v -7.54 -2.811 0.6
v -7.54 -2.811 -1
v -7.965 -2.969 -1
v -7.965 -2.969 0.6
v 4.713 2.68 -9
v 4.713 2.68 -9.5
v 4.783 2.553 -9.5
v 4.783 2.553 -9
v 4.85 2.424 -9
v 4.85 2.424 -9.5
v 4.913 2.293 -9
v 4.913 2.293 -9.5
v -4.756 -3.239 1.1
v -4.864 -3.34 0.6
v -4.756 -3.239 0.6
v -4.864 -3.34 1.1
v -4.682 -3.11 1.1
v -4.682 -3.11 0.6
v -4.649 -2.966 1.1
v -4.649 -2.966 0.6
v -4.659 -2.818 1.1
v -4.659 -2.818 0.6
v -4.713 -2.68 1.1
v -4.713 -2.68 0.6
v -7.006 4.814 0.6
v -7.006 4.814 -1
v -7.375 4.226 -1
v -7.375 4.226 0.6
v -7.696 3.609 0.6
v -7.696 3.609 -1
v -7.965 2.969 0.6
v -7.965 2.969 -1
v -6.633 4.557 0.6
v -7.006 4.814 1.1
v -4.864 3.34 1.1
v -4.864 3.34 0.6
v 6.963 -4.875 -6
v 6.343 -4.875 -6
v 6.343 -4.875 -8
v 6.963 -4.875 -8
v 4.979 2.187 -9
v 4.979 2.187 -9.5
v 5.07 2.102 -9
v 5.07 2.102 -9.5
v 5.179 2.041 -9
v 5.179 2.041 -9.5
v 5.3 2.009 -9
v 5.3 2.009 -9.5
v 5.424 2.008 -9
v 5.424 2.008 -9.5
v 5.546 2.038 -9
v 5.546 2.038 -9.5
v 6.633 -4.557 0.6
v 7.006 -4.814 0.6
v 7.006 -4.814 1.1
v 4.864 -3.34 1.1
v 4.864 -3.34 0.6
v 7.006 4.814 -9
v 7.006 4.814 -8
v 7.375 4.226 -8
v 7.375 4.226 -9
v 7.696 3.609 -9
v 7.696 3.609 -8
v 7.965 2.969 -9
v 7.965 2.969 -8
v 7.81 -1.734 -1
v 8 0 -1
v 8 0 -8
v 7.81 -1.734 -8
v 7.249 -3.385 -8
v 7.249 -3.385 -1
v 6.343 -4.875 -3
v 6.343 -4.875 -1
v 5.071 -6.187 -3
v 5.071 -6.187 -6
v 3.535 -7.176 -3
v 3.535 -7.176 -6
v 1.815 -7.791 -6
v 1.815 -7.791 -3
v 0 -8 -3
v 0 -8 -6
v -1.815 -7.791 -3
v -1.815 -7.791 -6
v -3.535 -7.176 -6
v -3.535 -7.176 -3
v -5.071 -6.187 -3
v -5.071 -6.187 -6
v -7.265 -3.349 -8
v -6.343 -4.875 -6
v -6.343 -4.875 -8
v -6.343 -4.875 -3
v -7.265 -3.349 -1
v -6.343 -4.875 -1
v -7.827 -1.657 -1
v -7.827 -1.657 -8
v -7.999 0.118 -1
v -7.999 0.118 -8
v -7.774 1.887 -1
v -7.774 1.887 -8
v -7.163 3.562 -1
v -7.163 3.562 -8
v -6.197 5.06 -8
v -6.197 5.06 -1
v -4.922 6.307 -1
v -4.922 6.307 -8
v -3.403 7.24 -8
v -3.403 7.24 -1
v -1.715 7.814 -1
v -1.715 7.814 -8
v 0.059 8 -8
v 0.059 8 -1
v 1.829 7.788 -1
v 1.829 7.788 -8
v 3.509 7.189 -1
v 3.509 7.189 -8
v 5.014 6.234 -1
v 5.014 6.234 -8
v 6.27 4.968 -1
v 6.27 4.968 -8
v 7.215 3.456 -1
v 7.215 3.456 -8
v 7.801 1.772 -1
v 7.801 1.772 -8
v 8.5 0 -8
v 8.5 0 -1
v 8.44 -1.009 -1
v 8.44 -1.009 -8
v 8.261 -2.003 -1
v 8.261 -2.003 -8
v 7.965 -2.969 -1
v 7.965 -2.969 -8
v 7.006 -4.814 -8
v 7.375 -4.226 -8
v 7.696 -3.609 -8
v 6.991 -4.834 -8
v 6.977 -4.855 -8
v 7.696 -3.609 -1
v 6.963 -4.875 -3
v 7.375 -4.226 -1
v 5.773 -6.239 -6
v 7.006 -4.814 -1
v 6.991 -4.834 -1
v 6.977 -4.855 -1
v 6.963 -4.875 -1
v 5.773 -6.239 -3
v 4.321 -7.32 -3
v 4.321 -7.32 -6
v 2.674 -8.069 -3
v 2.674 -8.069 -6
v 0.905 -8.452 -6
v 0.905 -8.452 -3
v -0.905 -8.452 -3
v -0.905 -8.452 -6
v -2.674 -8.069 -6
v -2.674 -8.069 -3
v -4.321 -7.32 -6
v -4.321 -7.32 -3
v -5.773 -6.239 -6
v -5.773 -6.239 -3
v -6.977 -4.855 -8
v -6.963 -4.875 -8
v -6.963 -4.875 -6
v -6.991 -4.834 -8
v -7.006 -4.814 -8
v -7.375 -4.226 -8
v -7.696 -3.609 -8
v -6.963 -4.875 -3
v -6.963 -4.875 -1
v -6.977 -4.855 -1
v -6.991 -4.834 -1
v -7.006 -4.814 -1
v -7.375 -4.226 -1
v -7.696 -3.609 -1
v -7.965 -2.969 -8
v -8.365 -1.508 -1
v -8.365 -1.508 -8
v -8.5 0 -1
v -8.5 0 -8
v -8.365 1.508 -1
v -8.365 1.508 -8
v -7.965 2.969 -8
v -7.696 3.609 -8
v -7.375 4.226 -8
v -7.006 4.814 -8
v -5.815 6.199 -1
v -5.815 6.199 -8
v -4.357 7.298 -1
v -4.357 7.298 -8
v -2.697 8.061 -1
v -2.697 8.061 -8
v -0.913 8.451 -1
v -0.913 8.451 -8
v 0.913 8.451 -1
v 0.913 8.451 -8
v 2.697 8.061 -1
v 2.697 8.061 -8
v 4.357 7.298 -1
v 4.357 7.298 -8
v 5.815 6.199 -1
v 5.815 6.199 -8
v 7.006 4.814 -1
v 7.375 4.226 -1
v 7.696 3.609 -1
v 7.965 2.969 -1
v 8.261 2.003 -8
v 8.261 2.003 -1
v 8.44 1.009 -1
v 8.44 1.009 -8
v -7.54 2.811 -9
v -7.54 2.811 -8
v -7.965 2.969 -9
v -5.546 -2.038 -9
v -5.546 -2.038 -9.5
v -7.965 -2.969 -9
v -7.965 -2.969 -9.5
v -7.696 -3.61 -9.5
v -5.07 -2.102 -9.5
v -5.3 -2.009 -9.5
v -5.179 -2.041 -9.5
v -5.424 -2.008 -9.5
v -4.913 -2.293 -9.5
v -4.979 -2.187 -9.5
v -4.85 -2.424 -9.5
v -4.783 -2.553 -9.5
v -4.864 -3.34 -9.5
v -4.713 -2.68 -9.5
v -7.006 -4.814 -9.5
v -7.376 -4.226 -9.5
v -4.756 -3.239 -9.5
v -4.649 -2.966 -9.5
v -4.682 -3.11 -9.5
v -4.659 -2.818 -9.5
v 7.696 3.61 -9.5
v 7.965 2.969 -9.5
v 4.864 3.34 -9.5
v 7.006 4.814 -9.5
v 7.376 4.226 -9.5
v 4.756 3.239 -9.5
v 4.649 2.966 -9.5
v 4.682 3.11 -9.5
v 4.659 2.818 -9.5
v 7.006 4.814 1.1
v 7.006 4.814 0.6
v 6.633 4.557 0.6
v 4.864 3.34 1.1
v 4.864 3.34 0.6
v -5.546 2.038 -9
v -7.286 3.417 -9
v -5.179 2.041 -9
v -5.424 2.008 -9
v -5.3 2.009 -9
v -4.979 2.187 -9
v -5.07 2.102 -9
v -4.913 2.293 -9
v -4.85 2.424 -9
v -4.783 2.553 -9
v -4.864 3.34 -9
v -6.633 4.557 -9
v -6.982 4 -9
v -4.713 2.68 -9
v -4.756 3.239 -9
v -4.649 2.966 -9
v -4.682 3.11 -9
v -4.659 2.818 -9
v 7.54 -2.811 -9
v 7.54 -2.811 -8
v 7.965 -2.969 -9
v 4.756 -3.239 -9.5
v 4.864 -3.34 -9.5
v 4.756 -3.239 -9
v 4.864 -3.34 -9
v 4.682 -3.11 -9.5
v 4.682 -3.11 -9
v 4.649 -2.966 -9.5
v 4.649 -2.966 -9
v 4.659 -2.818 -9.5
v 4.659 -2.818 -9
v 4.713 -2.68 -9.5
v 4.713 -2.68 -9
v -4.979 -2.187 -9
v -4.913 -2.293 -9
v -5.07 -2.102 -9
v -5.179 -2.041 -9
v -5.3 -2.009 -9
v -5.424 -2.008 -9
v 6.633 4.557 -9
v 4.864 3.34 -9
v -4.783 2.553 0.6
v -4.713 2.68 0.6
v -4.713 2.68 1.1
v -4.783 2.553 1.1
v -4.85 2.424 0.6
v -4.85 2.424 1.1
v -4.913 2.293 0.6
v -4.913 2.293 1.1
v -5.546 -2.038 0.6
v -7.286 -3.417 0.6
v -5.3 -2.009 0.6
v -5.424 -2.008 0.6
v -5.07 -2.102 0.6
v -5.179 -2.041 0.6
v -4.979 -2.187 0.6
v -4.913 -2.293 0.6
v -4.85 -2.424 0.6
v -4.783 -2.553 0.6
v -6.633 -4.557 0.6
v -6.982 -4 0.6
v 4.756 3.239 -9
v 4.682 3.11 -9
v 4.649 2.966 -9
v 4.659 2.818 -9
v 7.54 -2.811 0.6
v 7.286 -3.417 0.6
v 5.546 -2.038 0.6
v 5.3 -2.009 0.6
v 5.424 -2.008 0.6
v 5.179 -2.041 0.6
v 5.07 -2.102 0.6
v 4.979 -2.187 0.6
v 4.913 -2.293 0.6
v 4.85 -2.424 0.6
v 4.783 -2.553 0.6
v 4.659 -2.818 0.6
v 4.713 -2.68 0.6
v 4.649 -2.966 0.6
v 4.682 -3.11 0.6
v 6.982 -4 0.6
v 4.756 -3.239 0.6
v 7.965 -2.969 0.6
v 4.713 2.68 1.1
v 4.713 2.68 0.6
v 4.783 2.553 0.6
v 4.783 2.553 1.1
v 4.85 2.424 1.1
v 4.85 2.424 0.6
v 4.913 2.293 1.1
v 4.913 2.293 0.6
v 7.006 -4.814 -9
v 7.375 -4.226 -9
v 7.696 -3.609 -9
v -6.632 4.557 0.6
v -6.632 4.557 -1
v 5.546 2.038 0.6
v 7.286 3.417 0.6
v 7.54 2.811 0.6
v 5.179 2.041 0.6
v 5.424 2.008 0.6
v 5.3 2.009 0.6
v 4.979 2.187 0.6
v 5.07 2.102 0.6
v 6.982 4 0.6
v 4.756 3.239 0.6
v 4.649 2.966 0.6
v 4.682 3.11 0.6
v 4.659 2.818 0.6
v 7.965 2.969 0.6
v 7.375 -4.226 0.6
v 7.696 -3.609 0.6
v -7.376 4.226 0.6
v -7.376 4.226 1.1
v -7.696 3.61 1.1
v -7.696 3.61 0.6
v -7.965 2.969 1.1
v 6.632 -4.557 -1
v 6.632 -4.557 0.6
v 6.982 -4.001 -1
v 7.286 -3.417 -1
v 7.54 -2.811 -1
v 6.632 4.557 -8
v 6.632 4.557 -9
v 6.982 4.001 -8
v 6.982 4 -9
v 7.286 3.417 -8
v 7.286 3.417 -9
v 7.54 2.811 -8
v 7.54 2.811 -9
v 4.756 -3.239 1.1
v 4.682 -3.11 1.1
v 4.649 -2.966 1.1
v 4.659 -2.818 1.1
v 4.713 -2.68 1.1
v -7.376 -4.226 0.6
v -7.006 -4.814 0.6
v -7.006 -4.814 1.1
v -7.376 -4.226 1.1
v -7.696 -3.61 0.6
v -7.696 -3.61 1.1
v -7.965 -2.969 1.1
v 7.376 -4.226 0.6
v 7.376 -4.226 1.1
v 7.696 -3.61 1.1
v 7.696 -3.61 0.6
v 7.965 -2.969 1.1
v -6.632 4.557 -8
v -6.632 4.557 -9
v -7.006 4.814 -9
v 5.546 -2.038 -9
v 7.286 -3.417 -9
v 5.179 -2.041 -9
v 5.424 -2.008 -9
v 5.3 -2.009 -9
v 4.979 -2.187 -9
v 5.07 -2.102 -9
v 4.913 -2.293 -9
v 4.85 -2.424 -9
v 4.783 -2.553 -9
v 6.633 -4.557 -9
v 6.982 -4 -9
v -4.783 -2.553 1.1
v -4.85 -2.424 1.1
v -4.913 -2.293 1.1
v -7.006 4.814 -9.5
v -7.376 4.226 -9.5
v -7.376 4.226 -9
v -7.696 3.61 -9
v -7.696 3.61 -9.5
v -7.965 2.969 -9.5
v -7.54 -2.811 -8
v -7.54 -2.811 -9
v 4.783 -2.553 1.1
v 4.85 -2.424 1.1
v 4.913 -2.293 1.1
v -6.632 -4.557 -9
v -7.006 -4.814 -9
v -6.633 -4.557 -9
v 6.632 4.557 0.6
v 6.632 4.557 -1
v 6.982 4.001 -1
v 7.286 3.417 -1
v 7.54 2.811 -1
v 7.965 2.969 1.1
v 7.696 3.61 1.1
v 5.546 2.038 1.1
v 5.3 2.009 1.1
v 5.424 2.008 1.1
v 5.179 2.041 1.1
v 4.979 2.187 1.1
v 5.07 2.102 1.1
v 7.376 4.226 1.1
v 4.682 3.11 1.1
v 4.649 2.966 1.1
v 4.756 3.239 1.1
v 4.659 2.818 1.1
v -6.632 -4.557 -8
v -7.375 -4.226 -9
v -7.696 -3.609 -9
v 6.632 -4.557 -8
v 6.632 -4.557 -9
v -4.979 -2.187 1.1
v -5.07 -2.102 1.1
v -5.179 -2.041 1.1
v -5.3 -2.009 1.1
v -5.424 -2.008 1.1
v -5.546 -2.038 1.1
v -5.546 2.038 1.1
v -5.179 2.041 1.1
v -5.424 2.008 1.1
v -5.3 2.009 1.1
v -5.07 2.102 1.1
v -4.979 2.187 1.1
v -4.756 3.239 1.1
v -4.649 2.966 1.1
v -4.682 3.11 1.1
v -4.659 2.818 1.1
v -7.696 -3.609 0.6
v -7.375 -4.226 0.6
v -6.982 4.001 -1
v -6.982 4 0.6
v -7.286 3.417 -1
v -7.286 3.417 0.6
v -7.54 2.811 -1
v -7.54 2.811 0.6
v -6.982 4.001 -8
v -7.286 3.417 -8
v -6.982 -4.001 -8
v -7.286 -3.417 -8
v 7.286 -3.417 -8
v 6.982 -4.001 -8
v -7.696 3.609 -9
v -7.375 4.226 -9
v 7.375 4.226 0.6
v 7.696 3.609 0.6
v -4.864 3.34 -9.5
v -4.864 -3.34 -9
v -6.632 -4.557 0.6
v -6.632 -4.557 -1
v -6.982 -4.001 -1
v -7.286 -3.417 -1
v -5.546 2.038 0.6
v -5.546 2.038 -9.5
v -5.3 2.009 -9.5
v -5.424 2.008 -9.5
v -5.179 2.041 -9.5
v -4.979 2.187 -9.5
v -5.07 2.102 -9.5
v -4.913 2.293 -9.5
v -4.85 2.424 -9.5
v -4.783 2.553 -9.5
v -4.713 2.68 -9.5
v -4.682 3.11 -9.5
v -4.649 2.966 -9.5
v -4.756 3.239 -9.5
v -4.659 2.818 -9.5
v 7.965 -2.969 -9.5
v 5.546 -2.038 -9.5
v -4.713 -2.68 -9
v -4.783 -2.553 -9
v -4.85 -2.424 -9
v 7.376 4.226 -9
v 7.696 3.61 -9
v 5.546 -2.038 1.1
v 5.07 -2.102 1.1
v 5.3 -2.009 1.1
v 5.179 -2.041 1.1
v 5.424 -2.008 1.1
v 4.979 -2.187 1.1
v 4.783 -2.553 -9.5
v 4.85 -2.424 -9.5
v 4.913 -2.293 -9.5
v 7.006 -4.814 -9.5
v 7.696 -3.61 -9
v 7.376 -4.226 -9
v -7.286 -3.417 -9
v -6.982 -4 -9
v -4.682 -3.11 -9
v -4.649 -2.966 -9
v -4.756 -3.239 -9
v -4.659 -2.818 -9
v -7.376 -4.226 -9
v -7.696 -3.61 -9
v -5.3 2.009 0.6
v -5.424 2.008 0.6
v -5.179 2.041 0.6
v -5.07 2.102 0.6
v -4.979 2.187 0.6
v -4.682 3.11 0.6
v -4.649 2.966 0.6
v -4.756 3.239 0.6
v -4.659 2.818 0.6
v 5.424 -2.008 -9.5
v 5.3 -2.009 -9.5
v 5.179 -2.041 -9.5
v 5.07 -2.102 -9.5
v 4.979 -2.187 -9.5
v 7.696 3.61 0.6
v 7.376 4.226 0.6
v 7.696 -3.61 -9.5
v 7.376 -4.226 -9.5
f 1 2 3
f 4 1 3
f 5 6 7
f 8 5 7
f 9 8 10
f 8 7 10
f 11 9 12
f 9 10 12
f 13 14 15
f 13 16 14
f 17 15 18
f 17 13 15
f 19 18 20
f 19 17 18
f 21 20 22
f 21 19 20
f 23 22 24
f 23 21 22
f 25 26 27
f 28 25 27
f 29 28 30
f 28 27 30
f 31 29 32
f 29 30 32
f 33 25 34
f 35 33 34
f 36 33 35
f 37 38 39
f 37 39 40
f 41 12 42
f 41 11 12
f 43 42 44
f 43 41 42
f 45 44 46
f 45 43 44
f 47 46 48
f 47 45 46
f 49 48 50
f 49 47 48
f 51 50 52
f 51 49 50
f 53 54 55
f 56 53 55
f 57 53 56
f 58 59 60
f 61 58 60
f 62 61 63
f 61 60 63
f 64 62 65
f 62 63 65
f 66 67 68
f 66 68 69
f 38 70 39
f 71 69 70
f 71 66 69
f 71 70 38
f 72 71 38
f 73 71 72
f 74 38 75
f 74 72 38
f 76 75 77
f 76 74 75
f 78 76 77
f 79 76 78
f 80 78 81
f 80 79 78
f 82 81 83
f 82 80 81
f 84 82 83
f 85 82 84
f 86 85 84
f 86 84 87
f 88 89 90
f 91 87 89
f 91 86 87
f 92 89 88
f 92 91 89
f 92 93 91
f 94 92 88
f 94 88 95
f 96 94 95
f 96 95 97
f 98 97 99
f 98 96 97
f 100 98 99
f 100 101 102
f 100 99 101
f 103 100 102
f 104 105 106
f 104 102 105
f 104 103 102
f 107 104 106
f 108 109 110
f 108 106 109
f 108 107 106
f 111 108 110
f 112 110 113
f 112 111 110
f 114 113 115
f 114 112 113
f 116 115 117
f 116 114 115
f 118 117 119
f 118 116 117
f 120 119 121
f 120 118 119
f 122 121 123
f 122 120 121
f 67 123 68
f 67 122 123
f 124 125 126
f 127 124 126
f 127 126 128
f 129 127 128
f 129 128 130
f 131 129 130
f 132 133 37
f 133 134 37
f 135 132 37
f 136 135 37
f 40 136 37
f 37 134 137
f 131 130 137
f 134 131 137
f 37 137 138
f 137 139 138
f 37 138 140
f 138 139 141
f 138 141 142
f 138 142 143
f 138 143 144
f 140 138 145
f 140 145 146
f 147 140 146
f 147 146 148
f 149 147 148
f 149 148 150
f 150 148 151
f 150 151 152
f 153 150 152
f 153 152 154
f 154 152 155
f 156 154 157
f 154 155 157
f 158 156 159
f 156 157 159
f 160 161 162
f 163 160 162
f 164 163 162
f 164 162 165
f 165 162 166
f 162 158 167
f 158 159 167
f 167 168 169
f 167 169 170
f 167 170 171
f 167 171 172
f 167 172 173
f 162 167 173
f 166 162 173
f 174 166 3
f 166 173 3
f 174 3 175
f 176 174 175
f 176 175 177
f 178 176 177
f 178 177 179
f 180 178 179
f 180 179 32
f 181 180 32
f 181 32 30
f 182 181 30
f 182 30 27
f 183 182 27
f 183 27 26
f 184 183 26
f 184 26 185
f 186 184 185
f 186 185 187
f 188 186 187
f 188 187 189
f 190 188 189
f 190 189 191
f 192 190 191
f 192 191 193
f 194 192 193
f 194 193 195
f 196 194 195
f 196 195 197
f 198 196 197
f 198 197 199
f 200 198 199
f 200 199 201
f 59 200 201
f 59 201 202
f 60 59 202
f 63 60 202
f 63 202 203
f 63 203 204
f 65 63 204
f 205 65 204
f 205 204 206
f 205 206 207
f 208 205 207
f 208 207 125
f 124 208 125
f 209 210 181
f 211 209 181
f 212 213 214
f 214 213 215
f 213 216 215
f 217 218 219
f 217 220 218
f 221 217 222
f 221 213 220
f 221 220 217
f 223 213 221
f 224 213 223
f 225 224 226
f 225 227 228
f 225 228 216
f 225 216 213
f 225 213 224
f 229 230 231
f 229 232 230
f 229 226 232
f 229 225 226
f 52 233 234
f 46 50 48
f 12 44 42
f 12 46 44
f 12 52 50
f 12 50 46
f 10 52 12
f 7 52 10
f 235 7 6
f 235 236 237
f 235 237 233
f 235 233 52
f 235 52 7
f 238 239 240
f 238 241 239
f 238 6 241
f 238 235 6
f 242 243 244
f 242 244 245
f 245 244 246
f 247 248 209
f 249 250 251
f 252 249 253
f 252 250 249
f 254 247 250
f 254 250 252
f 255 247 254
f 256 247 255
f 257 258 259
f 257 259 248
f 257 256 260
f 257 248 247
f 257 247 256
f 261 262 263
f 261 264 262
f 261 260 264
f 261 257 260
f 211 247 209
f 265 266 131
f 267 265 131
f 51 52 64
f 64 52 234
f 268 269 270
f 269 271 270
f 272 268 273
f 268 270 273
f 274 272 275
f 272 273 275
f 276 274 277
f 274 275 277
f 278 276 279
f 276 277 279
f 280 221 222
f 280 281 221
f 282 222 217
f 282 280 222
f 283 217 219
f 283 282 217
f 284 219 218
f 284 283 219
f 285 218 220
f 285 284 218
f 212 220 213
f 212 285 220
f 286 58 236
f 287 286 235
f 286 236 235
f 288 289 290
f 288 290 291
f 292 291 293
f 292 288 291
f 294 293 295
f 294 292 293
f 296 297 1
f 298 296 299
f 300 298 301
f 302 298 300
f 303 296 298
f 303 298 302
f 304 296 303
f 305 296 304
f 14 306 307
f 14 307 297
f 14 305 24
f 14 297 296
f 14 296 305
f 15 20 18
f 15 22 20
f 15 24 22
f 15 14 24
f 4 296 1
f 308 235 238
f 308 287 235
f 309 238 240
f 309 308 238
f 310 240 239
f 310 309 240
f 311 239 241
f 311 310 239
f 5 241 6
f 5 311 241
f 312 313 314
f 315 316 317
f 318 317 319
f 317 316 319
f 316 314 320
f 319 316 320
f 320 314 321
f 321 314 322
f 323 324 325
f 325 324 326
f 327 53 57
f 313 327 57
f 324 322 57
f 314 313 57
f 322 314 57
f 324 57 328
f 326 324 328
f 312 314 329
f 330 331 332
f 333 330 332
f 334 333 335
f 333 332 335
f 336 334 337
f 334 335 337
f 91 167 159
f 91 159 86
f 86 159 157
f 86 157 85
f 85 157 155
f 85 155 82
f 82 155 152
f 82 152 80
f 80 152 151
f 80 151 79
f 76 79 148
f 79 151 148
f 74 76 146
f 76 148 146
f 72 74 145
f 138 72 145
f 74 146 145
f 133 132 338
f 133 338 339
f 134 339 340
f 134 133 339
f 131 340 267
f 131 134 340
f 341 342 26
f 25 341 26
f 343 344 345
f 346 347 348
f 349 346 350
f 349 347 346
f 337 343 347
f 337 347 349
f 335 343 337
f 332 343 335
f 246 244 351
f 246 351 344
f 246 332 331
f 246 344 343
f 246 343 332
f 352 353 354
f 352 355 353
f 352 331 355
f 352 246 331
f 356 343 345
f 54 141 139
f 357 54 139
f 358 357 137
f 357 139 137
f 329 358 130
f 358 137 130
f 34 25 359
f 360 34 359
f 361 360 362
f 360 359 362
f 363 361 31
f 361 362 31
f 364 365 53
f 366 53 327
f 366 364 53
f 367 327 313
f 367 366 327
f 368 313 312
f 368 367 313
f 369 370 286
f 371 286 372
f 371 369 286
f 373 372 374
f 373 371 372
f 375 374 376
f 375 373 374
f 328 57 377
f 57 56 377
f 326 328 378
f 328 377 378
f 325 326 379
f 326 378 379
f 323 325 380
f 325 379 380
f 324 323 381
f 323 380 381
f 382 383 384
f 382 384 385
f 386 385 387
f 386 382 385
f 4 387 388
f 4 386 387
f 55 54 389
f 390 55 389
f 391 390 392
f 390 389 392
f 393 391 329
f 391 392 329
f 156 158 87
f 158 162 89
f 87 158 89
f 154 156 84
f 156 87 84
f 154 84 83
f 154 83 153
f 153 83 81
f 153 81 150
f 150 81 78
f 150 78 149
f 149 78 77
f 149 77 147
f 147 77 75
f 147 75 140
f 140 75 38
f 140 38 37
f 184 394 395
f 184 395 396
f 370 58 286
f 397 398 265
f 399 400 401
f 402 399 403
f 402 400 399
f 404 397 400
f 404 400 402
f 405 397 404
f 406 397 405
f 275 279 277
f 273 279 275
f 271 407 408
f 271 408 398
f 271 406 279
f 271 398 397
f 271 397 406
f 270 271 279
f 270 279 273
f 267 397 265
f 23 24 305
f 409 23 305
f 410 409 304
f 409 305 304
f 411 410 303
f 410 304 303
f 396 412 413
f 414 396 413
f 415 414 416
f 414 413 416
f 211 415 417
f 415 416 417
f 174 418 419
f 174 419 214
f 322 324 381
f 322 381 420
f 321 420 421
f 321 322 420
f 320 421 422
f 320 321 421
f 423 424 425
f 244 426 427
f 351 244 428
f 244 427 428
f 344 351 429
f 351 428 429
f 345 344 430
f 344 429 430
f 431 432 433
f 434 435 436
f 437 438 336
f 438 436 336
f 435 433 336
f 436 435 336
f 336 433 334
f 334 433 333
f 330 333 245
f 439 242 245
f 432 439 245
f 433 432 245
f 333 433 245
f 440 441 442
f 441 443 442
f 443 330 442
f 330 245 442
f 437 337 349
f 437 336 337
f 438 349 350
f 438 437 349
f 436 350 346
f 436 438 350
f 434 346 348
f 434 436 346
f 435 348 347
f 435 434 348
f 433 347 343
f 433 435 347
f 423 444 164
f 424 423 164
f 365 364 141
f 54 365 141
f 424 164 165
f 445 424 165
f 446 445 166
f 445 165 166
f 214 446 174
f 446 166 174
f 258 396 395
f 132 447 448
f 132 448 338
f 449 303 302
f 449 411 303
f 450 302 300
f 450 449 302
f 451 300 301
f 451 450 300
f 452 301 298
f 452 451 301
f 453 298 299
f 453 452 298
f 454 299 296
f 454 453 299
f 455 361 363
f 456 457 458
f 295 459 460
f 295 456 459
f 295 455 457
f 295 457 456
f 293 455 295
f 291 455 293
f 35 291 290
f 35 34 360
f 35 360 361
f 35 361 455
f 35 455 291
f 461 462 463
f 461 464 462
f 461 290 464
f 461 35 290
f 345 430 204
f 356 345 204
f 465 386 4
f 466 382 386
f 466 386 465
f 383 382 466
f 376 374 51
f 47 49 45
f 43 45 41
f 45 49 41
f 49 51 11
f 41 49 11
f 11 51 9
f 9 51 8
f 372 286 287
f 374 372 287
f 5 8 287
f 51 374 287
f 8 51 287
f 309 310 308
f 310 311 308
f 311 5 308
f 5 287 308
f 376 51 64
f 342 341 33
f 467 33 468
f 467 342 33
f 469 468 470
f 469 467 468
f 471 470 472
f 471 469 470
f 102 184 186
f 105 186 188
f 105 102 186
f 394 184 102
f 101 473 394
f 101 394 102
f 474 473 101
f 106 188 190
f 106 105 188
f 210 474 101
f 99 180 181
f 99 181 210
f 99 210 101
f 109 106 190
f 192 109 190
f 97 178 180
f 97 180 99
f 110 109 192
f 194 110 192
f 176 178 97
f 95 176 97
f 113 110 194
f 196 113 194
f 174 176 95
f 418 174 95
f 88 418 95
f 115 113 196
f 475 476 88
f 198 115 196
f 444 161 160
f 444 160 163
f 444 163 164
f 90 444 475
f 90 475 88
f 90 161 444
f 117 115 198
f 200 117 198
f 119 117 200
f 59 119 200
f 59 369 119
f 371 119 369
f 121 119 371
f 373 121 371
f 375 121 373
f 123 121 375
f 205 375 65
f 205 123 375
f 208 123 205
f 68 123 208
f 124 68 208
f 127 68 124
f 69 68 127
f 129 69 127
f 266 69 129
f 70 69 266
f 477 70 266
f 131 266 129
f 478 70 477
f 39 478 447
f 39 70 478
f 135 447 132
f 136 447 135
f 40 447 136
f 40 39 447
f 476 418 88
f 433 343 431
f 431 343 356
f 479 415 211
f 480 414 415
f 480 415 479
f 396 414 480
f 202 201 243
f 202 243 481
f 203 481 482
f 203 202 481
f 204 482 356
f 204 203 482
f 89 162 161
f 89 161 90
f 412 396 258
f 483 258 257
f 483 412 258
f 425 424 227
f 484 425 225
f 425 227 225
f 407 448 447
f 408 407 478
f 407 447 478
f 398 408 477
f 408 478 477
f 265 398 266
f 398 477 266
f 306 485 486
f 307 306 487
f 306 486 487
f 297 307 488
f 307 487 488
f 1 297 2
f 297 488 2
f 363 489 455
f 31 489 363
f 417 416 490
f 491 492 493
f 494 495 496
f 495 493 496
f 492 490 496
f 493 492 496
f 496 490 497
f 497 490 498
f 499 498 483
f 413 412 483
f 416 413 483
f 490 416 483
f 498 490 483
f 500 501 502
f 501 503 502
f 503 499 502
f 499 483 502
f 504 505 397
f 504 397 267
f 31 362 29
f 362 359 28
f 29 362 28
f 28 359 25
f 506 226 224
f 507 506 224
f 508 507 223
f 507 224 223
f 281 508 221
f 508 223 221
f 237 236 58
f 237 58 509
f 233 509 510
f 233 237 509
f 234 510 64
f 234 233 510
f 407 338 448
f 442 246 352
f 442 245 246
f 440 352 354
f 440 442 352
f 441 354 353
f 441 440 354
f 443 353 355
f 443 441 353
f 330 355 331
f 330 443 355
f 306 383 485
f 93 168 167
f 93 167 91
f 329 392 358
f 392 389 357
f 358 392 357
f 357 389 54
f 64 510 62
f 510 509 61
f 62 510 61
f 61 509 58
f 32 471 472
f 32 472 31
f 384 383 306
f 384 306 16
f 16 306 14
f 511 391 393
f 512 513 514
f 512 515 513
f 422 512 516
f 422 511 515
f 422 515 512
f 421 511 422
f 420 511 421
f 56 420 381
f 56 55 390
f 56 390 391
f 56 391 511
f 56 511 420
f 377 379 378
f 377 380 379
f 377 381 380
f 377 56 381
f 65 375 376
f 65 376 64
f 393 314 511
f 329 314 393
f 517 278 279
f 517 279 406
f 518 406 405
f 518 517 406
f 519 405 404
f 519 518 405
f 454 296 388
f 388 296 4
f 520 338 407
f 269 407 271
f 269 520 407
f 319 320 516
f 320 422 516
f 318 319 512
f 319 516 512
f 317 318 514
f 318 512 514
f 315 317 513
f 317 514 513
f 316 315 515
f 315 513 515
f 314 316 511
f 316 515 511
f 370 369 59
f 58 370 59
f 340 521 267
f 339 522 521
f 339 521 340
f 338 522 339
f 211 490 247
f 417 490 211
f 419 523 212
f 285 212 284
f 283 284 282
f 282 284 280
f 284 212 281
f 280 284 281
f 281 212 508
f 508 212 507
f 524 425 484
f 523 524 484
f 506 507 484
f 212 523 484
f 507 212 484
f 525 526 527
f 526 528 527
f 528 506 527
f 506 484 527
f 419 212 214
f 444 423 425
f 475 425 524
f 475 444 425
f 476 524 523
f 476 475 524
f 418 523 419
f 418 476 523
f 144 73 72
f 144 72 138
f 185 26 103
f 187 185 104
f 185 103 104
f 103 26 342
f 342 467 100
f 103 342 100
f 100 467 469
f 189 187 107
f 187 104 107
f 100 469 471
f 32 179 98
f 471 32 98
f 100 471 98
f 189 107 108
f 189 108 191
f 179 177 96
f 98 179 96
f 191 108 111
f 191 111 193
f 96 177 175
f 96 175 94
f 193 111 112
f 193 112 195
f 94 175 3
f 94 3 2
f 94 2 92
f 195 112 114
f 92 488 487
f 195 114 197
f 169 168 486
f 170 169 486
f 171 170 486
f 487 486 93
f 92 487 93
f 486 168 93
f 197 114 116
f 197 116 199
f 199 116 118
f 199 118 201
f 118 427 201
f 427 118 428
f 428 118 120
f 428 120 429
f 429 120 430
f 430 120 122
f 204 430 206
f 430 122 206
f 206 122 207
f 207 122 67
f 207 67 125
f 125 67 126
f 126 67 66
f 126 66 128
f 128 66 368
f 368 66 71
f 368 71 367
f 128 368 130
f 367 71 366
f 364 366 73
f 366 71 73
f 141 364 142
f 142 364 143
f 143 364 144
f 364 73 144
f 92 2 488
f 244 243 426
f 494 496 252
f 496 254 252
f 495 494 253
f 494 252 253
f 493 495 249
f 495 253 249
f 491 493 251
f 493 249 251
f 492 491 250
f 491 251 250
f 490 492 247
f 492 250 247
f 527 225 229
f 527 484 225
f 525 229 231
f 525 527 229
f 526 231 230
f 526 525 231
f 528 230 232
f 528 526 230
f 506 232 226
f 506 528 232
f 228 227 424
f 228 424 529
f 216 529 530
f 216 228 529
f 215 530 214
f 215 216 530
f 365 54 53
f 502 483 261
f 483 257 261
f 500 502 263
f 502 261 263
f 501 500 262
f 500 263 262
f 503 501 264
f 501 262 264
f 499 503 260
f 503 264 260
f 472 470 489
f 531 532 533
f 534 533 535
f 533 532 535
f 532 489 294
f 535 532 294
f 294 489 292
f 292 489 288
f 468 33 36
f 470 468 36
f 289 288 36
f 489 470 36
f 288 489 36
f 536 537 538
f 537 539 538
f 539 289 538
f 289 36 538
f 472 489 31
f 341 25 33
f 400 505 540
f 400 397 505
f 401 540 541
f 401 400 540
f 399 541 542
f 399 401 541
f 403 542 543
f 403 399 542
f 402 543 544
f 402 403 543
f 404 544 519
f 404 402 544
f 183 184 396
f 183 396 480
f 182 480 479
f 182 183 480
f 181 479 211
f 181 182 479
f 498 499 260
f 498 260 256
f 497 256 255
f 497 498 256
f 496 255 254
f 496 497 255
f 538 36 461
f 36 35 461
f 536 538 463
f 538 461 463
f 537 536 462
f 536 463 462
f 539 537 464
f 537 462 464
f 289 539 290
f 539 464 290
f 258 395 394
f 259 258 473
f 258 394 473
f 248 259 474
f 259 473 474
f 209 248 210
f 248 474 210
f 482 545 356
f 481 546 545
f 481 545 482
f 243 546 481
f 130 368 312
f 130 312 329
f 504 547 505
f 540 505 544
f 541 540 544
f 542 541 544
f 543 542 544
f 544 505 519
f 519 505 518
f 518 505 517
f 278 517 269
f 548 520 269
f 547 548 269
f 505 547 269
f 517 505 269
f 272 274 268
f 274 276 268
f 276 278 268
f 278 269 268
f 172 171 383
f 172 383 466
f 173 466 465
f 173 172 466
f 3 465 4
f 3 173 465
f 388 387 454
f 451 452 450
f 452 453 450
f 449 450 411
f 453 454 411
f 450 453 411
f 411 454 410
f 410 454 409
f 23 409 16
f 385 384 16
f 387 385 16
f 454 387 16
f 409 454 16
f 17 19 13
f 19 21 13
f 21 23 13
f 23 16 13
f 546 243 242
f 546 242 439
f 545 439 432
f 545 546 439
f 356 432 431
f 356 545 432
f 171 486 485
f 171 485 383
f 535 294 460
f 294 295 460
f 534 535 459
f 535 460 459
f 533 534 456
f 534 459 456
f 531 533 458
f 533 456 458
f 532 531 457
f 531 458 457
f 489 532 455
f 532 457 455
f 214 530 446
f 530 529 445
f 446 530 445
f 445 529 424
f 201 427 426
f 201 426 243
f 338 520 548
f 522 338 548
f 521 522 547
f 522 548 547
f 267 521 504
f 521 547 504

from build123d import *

# Parameters (mm, degrees)
SKETCH007_R                    = 8.5
PAD006_DEPTH                   = 7
THICKNESS_T                    = -0.5
PAD007_DEPTH                   = 1.6
PAD007_POLARPATTERN_2_DEPTH    = 1.6
PAD008_DEPTH                   = 0.5
PAD008_POLARPATTERN001_2_DEPTH = 0.5
SKETCH011_W                    = 13.925584
SKETCH011_H                    = 6.6246
POCKET001_DEPTH                = 2
SKETCH013_W                    = 13.925584
SKETCH013_H                    = 6.6246
POCKET002_DEPTH                = 2
SKETCH014_R                    = 8
POCKET003_DEPTH                = 0.5
PAD009_DEPTH                   = 1
PAD009_MIRRORED002_2_DEPTH     = 1
PAD010_DEPTH                   = 0.5
PAD010_MIRRORED004_2_DEPTH     = 0.5
FILLET_R                       = 0.5


with BuildPart() as part:
    # Sketch007 (on DatumPlane) → Pad006 (new body)
    with BuildSketch(Plane(origin=(0, 0, -1), x_dir=(1, 0, 0), z_dir=(0, 0, -1))):
        Circle(SKETCH007_R)
    extrude(amount=PAD006_DEPTH)

    # Thickness
    thickness_openings = [part.faces().sort_by_distance(p)[0] for p in [
        (0, 0, -1),
    ]]
    offset(amount=THICKNESS_T, openings=thickness_openings)

    # Sketch008 (on Face3 of Thickness) → Pad007 (join)
    with BuildSketch(Plane.XY.offset(-1)):
        with BuildLine():
            ThreePointArc((-7.005526, 4.813794), (-7.541696, 3.920819), (-7.964623, 2.96897))
            Line((-7.540357, 2.810816), (-7.964623, 2.96897))
            ThreePointArc((-6.632349, 4.557368), (-7.139959, 3.711961), (-7.540357, 2.810816))
            Line((-6.632349, 4.557368), (-7.005526, 4.813794))
        make_face()
    pad007 = extrude(amount=PAD007_DEPTH)

    # Sketch008 PolarPattern 2 → Pad007 PolarPattern 2 (add)
    with BuildSketch(Plane(origin=(0, 0, -1), x_dir=(-1, 0, 0), z_dir=(0, 0, 1))):
        with BuildLine():
            ThreePointArc((-7.005526, 4.813794), (-7.541696, 3.920819), (-7.964623, 2.96897))
            Line((-7.540357, 2.810816), (-7.964623, 2.96897))
            ThreePointArc((-6.632349, 4.557368), (-7.139959, 3.711961), (-7.540357, 2.810816))
            Line((-6.632349, 4.557368), (-7.005526, 4.813794))
        make_face()
    pad007_polarpattern_2 = extrude(amount=PAD007_POLARPATTERN_2_DEPTH)

    # Mirrored: Pad007, Pad007 PolarPattern 2 across Sketch008 V_Axis
    add(pad007.mirror(Plane(origin=(0, 0, -1), x_dir=(0, 0, 1), z_dir=(1, 0, 0))))
    add(pad007_polarpattern_2.mirror(Plane(origin=(0, 0, -1), x_dir=(0, 0, 1), z_dir=(1, 0, 0))))

    # Sketch009 (on Face23 of MultiTransform) → Pad008 (join)
    with BuildSketch(Plane.XY.offset(0.6)):
        with BuildLine():
            ThreePointArc((-7.005526, 4.813794), (-7.542066, 3.921011), (-7.964623, 2.96897))
            Line((-5.09111, 1.862853), (-7.964623, 2.96897))
            ThreePointArc((-4.469489, 3.068188), (-4.818529, 2.485236), (-5.09111, 1.862853))
            Line((-7.005526, 4.813794), (-4.469489, 3.068188))
        make_face()
    pad008 = extrude(amount=PAD008_DEPTH)

    # Sketch009 PolarPattern001 2 → Pad008 PolarPattern001 2 (add)
    with BuildSketch(Plane(origin=(0, 0, 0.6), x_dir=(-1, 0, 0), z_dir=(0, 0, 1))):
        with BuildLine():
            ThreePointArc((-7.005526, 4.813794), (-7.542066, 3.921011), (-7.964623, 2.96897))
            Line((-5.09111, 1.862853), (-7.964623, 2.96897))
            ThreePointArc((-4.469489, 3.068188), (-4.818529, 2.485236), (-5.09111, 1.862853))
            Line((-7.005526, 4.813794), (-4.469489, 3.068188))
        make_face()
    pad008_polarpattern001_2 = extrude(amount=PAD008_POLARPATTERN001_2_DEPTH)

    # Mirrored001: Pad008, Pad008 PolarPattern001 2 across Sketch009 V_Axis
    add(pad008.mirror(Plane(origin=(0, 0, 0.6), x_dir=(0, 0, 1), z_dir=(1, 0, 0))))
    add(pad008_polarpattern001_2.mirror(Plane(origin=(0, 0, 0.6), x_dir=(0, 0, 1), z_dir=(1, 0, 0))))

    # Sketch011 (on Face1 of ShapeBinder001) → Pocket001 (cut)
    with BuildSketch(Plane(origin=(0, 0, -1), x_dir=(1, 0, 0), z_dir=(0, 0, -1))):
        with Locations((0, 8.1877)):
            Rectangle(SKETCH011_W, SKETCH011_H)
    extrude(amount=POCKET001_DEPTH, mode=Mode.SUBTRACT)

    # Sketch013 → Pocket002 (cut)
    with BuildSketch(Plane.XY.offset(-8)):
        with Locations((0, -8.1877)):
            Rectangle(SKETCH013_W, SKETCH013_H)
    extrude(amount=POCKET002_DEPTH, mode=Mode.SUBTRACT)

    # Sketch014 → Pocket003 (cut)
    with BuildSketch(Plane.XY.offset(-8)):
        Circle(SKETCH014_R)
    extrude(amount=POCKET003_DEPTH, mode=Mode.SUBTRACT)

    # Sketch012 → Pad009 (join)
    with BuildSketch(Plane.XY.offset(-8)):
        with BuildLine():
            ThreePointArc((-7.005526, 4.813794), (-7.541696, 3.920819), (-7.964623, 2.96897))
            Line((-7.540357, 2.810816), (-7.964623, 2.96897))
            ThreePointArc((-6.632349, 4.557368), (-7.139959, 3.711961), (-7.540357, 2.810816))
            Line((-6.632349, 4.557368), (-7.005526, 4.813794))
        make_face()
    pad009 = extrude(amount=-PAD009_DEPTH)

    # Sketch012 Mirrored002 2 → Pad009 Mirrored002 2 (add)
    with BuildSketch(Plane(origin=(0, 0, -8), x_dir=(-1, 0, 0), z_dir=(0, 0, -1))):
        with BuildLine():
            ThreePointArc((-7.005526, 4.813794), (-7.541696, 3.920819), (-7.964623, 2.96897))
            Line((-7.540357, 2.810816), (-7.964623, 2.96897))
            ThreePointArc((-6.632349, 4.557368), (-7.139959, 3.711961), (-7.540357, 2.810816))
            Line((-6.632349, 4.557368), (-7.005526, 4.813794))
        make_face()
    pad009_mirrored002_2 = extrude(amount=PAD009_MIRRORED002_2_DEPTH)

    # Mirrored003: Pad009, Pad009 Mirrored002 2 across Sketch012 H_Axis
    add(pad009.mirror(Plane(origin=(0, 0, -8), x_dir=(0, 0, 1), z_dir=(0, 1, 0))))
    add(pad009_mirrored002_2.mirror(Plane(origin=(0, 0, -8), x_dir=(0, 0, 1), z_dir=(0, 1, 0))))

    # Sketch015 → Pad010 (join)
    with BuildSketch(Plane.XY.offset(-9.5)):
        with BuildLine():
            ThreePointArc((-7.005526, 4.813794), (-7.542066, 3.921011), (-7.964623, 2.96897))
            Line((-5.09111, 1.862853), (-7.964623, 2.96897))
            ThreePointArc((-4.469489, 3.068188), (-4.818529, 2.485236), (-5.09111, 1.862853))
            Line((-7.005526, 4.813794), (-4.469489, 3.068188))
        make_face()
    pad010 = extrude(amount=PAD010_DEPTH)

    # Sketch015 Mirrored004 2 → Pad010 Mirrored004 2 (add)
    with BuildSketch(Plane(origin=(0, 0, -9.5), x_dir=(-1, 0, 0), z_dir=(0, 0, -1))):
        with BuildLine():
            ThreePointArc((-7.005526, 4.813794), (-7.542066, 3.921011), (-7.964623, 2.96897))
            Line((-5.09111, 1.862853), (-7.964623, 2.96897))
            ThreePointArc((-4.469489, 3.068188), (-4.818529, 2.485236), (-5.09111, 1.862853))
            Line((-7.005526, 4.813794), (-4.469489, 3.068188))
        make_face()
    pad010_mirrored004_2 = extrude(amount=-PAD010_MIRRORED004_2_DEPTH)

    # Mirrored005: Pad010, Pad010 Mirrored004 2 across Sketch015 H_Axis
    add(pad010.mirror(Plane(origin=(0, 0, -9.5), x_dir=(0, 0, 1), z_dir=(0, 1, 0))))
    add(pad010_mirrored004_2.mirror(Plane(origin=(0, 0, -9.5), x_dir=(0, 0, 1), z_dir=(0, 1, 0))))

    # Fillet
    fillet_edges = [part.edges().sort_by_distance(p)[0] for p in [
        (-4.469489, 3.068188, 0.85),
        (-5.09111, 1.862853, 0.85),
        (-5.09111, -1.862853, 0.85),
        (-4.469489, -3.068188, 0.85),
        (4.469489, 3.068188, 0.85),
        (5.09111, 1.862853, 0.85),
        (5.09111, -1.862853, 0.85),
        (4.469489, -3.068188, 0.85),
        (-4.469489, 3.068188, -9.25),
        (-5.09111, 1.862853, -9.25),
        (4.469489, 3.068188, -9.25),
        (5.09111, 1.862853, -9.25),
        (-5.09111, -1.862853, -9.25),
        (-4.469489, -3.068188, -9.25),
        (5.09111, -1.862853, -9.25),
        (4.469489, -3.068188, -9.25),
    ]]
    fillet(fillet_edges, radius=FILLET_R)


solid = part.part
